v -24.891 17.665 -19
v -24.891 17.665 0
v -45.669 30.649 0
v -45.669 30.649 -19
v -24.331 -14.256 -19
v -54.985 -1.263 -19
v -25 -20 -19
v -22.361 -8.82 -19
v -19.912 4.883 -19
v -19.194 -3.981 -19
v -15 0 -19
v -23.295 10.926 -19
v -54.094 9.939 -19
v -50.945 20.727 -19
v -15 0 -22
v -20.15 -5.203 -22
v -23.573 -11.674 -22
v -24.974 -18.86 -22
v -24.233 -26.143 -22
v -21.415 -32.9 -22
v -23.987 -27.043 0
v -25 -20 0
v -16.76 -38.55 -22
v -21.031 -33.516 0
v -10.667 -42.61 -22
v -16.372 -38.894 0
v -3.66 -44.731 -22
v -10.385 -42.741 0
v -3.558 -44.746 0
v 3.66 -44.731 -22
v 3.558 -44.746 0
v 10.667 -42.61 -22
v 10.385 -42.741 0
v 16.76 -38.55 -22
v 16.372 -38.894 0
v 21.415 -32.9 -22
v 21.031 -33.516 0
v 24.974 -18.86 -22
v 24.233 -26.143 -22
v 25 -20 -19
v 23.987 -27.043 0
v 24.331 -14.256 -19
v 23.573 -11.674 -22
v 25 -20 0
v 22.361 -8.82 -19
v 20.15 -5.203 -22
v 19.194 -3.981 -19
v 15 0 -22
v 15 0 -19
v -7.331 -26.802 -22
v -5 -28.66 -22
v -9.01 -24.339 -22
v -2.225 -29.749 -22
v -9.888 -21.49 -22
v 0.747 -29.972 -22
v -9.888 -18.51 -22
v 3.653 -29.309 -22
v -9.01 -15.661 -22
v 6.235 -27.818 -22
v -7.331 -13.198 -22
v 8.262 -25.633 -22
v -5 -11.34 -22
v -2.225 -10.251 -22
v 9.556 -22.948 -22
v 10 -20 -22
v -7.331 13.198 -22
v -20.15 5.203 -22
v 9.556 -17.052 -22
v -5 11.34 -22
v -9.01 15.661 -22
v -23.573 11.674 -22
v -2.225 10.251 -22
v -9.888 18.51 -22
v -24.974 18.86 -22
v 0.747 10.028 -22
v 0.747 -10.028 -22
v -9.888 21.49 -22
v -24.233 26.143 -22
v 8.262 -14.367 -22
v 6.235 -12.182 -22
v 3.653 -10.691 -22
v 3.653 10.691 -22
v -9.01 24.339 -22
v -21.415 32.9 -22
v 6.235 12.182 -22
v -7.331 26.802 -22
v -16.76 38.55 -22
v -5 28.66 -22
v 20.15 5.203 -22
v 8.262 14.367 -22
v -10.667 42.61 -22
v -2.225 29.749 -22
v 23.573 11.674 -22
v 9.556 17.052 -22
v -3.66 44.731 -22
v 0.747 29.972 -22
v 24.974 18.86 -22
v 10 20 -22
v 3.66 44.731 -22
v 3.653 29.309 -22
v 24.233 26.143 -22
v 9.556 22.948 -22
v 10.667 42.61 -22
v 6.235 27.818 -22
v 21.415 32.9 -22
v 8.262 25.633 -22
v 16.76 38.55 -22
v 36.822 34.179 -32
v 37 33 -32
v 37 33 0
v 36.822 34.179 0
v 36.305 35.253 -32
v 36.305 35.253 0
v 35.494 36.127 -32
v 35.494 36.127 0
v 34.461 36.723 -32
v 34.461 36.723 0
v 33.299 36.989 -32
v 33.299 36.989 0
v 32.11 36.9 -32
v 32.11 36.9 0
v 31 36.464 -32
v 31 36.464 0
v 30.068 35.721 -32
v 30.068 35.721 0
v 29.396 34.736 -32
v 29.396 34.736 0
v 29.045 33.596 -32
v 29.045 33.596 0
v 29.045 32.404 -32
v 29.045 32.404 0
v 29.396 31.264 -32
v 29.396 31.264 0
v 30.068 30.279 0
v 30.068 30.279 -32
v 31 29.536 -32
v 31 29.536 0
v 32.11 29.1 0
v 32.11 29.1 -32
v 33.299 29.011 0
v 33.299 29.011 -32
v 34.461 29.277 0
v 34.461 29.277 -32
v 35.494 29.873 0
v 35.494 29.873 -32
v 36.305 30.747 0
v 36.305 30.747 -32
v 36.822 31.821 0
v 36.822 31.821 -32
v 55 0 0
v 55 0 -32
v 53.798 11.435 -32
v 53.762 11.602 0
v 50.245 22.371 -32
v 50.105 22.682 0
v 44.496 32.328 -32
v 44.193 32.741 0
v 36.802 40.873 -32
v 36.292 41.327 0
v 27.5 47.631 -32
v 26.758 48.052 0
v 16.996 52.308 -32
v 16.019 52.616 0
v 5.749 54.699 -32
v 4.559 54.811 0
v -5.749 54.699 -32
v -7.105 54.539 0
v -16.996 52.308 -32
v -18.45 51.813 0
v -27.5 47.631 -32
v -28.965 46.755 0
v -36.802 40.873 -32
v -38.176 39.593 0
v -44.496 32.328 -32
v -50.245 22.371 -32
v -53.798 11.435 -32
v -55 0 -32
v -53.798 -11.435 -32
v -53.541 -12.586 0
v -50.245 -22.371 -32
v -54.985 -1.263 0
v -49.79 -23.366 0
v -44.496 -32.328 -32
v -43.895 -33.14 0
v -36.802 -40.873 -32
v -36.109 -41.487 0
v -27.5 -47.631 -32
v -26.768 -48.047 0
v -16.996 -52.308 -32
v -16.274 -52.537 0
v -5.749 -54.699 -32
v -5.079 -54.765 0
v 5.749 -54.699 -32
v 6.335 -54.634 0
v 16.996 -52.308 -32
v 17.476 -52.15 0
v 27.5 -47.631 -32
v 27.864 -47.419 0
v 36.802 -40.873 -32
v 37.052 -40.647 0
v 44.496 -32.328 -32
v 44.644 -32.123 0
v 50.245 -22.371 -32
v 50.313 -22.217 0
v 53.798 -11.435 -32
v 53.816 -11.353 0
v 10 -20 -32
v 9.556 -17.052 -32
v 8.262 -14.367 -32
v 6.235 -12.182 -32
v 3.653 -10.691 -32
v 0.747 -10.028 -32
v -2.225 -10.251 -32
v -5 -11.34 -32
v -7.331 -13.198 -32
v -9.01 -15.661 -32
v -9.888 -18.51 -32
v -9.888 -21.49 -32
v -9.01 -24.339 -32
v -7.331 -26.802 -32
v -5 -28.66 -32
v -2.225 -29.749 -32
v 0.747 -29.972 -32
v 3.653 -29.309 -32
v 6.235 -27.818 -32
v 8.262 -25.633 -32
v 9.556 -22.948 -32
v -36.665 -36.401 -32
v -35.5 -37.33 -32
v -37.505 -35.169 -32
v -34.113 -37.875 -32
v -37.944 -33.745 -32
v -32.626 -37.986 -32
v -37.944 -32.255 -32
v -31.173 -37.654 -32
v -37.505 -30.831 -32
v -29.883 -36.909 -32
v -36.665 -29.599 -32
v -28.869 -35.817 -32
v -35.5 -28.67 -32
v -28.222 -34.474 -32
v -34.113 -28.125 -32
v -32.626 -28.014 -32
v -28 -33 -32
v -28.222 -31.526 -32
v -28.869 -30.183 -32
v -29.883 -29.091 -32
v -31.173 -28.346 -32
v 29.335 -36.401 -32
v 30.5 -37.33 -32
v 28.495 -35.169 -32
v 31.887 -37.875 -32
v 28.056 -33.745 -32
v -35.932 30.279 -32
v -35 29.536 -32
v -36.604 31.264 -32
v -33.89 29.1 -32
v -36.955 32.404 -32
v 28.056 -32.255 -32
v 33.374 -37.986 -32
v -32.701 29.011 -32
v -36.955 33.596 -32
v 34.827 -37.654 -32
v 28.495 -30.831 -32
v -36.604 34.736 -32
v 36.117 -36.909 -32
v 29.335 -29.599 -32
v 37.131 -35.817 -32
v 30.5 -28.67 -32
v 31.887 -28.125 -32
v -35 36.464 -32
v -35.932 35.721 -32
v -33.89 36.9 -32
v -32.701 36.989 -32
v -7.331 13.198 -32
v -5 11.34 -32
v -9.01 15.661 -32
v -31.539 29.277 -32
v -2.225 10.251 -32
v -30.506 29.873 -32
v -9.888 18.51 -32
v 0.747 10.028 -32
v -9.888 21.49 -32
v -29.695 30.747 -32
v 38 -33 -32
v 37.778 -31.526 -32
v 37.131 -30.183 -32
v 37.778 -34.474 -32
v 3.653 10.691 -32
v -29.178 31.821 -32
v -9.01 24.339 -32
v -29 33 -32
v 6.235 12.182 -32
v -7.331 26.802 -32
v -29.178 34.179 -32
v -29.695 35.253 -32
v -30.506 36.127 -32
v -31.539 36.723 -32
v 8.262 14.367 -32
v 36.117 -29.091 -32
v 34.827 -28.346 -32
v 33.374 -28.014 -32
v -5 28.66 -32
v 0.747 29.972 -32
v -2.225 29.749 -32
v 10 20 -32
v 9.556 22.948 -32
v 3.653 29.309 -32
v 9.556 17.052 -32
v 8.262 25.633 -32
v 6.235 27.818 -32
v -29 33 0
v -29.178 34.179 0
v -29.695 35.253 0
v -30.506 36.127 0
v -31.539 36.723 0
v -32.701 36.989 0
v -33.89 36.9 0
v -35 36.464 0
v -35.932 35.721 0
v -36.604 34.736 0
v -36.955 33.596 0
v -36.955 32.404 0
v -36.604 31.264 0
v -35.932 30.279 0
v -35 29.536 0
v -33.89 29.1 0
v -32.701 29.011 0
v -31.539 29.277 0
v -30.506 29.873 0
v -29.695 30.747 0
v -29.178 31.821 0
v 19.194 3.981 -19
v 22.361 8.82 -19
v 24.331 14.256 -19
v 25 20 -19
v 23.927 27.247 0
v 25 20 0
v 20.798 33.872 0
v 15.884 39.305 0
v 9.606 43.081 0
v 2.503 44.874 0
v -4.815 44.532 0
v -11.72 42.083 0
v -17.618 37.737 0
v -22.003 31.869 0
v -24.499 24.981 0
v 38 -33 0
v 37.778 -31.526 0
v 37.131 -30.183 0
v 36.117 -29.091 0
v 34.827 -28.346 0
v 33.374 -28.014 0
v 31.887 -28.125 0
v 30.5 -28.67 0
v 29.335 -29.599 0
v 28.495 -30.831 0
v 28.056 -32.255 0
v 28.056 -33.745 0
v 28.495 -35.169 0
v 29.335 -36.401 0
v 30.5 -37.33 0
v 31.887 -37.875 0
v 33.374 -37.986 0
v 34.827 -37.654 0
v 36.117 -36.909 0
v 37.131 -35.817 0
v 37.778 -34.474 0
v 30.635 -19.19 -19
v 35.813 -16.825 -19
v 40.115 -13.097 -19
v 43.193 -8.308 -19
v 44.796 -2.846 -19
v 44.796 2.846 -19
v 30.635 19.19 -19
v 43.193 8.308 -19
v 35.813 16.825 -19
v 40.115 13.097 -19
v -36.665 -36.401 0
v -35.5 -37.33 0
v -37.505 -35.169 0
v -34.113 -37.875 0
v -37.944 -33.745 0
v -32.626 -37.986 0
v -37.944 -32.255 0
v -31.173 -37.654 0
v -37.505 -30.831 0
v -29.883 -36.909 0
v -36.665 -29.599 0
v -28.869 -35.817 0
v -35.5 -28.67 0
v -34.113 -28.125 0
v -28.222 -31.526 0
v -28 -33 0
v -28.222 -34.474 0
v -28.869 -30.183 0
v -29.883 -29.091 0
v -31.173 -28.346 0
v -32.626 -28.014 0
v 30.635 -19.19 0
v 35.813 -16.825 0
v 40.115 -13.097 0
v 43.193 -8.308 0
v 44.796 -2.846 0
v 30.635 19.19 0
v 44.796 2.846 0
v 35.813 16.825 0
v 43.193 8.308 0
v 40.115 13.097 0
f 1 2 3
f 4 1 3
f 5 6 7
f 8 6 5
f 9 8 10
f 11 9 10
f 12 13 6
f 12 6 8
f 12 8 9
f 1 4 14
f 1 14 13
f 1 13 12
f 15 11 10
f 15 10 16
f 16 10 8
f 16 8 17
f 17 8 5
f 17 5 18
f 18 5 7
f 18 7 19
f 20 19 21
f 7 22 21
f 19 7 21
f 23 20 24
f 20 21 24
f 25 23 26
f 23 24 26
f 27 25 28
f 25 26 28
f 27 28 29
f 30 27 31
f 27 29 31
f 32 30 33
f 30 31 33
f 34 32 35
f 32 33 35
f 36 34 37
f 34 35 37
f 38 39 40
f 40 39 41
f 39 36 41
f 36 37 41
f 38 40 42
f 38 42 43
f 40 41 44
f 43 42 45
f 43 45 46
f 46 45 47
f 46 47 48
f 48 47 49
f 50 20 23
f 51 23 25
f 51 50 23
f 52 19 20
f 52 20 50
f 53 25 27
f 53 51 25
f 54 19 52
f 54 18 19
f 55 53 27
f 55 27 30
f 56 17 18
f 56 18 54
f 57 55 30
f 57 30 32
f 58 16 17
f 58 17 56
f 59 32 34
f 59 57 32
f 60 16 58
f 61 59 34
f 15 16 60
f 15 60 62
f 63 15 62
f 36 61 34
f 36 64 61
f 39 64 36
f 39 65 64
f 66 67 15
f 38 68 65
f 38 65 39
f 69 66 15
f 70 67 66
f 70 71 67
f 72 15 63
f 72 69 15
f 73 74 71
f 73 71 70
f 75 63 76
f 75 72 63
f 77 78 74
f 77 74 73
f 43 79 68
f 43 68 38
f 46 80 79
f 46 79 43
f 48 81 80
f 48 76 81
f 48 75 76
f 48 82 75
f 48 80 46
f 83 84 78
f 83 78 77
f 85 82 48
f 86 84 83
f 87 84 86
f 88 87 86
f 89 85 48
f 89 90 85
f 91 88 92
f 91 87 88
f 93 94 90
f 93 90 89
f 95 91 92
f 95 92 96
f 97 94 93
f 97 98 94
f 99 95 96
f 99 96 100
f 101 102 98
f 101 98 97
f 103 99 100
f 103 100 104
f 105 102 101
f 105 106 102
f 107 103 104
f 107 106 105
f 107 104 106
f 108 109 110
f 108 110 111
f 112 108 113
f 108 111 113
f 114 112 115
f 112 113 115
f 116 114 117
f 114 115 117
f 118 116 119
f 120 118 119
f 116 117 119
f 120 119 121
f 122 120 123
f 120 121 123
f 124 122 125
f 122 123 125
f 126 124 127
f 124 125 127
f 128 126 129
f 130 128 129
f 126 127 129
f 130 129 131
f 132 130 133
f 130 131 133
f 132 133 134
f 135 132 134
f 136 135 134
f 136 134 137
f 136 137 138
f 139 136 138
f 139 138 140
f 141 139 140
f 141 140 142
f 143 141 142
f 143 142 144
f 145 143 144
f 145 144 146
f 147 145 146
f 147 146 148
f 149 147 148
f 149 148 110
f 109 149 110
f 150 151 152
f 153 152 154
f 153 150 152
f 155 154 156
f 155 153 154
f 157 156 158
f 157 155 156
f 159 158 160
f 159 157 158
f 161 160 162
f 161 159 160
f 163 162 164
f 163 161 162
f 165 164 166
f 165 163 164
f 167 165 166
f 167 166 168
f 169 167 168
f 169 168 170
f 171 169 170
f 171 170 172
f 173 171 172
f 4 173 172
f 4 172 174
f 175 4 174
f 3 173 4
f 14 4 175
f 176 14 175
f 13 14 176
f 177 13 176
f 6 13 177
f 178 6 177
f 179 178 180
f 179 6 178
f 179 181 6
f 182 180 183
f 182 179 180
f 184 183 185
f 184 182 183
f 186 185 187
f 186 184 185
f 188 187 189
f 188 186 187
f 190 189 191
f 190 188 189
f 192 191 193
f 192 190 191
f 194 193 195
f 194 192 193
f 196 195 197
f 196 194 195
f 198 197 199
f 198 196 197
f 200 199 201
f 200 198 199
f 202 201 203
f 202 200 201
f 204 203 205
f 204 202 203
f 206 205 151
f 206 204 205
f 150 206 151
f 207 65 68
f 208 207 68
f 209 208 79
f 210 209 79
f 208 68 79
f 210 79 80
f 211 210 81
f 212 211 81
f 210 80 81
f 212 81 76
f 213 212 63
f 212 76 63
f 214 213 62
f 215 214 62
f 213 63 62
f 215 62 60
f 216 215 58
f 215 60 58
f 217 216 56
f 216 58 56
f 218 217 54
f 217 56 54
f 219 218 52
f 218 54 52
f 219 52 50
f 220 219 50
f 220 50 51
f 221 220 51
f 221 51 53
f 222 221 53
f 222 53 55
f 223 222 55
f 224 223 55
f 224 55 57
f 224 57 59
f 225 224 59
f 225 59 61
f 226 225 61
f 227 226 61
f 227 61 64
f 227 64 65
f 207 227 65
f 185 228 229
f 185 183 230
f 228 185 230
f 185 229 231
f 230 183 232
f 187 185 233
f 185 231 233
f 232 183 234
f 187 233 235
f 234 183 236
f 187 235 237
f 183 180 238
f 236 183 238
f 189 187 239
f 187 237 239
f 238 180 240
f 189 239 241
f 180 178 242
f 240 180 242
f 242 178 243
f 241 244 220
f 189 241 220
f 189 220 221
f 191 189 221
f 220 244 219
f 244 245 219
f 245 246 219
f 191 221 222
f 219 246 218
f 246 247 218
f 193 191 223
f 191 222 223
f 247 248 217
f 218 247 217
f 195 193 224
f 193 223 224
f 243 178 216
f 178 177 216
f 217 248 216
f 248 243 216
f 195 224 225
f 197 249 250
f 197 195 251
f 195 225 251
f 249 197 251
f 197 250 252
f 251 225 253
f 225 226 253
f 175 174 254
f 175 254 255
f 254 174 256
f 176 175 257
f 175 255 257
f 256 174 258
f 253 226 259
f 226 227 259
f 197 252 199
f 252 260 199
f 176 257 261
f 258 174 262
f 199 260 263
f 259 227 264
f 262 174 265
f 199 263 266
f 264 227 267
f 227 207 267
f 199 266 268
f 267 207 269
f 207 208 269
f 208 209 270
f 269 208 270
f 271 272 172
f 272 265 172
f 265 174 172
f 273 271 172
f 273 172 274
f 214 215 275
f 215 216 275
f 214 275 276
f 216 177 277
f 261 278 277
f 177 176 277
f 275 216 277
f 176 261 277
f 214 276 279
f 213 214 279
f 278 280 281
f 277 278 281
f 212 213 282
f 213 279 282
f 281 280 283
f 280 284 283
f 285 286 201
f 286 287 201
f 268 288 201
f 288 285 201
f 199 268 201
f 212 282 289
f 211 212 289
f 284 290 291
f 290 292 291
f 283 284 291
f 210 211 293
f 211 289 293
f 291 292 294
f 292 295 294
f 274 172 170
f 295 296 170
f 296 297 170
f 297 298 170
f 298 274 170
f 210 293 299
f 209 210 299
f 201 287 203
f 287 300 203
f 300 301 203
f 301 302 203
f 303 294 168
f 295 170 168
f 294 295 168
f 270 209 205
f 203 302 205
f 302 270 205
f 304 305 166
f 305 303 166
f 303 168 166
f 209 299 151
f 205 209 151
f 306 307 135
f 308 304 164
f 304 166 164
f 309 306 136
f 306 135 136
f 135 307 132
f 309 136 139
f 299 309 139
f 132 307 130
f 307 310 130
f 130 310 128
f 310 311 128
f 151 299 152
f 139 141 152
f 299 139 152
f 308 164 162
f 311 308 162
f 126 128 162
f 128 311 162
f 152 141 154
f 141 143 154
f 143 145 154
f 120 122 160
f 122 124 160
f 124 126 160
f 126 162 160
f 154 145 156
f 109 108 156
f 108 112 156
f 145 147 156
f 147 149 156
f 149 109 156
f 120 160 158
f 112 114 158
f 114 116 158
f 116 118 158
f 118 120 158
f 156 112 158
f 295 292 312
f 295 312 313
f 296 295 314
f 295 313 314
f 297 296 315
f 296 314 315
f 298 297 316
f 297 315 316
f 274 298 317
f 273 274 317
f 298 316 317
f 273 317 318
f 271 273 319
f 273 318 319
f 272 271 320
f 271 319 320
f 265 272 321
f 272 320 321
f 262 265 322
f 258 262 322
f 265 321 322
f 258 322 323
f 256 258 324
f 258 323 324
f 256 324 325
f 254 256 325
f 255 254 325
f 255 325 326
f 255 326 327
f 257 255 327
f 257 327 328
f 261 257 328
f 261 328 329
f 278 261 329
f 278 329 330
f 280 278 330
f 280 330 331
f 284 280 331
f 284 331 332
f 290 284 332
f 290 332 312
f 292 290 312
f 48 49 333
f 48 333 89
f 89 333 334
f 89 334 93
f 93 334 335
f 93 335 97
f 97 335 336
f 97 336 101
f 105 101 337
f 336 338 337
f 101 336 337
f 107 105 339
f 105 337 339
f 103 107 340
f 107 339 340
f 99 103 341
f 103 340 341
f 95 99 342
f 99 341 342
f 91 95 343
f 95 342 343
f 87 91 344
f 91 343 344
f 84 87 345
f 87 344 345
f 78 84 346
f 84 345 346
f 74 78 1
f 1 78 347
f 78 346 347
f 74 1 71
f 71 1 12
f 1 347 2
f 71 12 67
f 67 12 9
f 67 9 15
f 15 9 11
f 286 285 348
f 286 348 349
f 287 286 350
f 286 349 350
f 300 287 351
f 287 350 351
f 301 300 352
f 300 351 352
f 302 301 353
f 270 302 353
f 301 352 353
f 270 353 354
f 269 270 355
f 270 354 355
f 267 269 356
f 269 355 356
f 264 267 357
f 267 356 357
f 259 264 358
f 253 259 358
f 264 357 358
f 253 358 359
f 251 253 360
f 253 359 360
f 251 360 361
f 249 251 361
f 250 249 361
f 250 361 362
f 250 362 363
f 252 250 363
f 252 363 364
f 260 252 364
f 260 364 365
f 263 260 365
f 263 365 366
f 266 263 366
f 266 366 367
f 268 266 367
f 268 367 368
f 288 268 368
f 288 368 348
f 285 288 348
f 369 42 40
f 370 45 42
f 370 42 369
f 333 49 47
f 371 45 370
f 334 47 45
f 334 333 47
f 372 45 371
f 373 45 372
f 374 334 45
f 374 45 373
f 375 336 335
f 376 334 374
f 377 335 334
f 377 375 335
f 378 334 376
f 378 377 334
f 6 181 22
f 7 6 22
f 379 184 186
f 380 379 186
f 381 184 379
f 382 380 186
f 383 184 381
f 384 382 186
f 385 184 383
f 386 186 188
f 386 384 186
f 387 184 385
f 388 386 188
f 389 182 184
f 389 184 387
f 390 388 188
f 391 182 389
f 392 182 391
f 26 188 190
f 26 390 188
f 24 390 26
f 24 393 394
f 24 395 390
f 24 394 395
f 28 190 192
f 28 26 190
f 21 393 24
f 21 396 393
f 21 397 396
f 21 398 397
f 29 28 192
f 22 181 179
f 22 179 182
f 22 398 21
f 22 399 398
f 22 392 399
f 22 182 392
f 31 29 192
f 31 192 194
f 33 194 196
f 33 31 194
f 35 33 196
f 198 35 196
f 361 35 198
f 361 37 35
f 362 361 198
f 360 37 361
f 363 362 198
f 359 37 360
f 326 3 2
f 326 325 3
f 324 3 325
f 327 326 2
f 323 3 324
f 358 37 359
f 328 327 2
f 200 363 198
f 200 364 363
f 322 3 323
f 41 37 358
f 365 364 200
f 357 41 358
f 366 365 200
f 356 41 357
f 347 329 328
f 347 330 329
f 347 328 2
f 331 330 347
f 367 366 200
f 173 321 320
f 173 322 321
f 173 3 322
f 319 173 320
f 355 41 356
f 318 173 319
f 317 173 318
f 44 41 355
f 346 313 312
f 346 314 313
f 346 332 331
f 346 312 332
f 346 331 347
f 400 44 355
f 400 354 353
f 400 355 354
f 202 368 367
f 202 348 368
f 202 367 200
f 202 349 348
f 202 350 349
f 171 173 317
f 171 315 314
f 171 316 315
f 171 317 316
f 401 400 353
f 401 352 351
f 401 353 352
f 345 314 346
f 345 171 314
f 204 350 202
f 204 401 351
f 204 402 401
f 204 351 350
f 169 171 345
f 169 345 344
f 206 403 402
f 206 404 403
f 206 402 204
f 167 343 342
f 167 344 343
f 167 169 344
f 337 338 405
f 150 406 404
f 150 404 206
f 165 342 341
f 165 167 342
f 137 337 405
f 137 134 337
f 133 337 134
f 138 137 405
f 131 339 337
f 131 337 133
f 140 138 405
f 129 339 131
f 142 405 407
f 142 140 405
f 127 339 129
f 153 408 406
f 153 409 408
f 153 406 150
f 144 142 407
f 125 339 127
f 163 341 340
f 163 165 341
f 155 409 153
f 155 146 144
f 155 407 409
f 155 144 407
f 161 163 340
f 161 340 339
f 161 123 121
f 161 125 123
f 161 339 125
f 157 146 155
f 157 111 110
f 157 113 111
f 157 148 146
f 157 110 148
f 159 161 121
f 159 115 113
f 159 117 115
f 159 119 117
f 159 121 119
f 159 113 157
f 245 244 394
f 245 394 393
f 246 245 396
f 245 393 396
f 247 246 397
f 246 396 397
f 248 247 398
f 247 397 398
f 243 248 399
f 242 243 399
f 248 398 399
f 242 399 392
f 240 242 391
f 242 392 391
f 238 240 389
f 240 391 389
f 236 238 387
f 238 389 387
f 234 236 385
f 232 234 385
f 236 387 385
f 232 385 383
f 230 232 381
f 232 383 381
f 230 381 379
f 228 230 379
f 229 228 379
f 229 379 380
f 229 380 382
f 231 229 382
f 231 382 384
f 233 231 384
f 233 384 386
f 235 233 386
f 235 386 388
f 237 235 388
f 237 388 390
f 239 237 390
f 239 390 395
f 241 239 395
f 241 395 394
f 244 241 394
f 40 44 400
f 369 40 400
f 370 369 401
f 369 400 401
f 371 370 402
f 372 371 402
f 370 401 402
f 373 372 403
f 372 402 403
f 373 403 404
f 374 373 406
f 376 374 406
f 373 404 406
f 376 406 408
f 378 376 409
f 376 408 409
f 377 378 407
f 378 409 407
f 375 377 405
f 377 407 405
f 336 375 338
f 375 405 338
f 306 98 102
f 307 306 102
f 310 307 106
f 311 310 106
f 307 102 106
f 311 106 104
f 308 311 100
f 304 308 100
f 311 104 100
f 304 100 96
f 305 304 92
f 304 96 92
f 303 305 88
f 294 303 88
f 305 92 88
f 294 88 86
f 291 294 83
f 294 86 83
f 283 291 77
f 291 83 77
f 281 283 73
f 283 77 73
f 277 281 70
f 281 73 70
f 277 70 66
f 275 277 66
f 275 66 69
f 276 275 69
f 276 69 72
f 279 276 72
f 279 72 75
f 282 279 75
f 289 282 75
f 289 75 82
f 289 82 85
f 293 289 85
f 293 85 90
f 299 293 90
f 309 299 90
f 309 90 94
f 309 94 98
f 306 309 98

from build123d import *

# Parameters (mm, degrees)
SKETCH1_R           = 55
BOSS_EXTRUDE1_DEPTH = 32
SKETCH1_19_R        = 10
CUT_EXTRUDE1_DEPTH  = 22
CUT_EXTRUDE2_DEPTH  = 19
SKETCH1_21_R        = 10
SKETCH1_21_R_2      = 4
SKETCH1_21_R_3      = 5
CUT_EXTRUDE3_DEPTH  = 85.107074613


with BuildPart() as part:
    # Sketch1 → Boss-Extrude1 (new body)
    with BuildSketch(Plane.XY):
        Circle(SKETCH1_R)
    extrude(amount=-BOSS_EXTRUDE1_DEPTH)

    # Sketch1<19> → Cut-Extrude1 (cut)
    # profile 1 of 3: a face of its own
    with BuildSketch(Plane.XY):
        with BuildLine():
            ThreePointArc((15, 0), (0, 45), (-15, 0))
            ThreePointArc((-15, 0), (0, -45), (15, 0))
        make_face()
        with Locations((0, -20)):
            Circle(SKETCH1_19_R, mode=Mode.SUBTRACT)
        with Locations((0, 20)):
            Circle(SKETCH1_19_R, mode=Mode.SUBTRACT)
    # profile 2 of 3: a face of its own
    with BuildSketch(Plane.XY):
        with Locations((0, -20)):
            Circle(SKETCH1_19_R)
    # profile 3 of 3: a face of its own
    with BuildSketch(Plane.XY):
        with Locations((0, 20)):
            Circle(SKETCH1_19_R)
    extrude(amount=-CUT_EXTRUDE1_DEPTH, mode=Mode.SUBTRACT)

    # Sketch1<20> → Cut-Extrude2 (cut)
    with BuildSketch(Plane.XY):
        with BuildLine():
            ThreePointArc((-45.668792135, 30.649003654), (-52.795976975, 15.41378653), (-54.985496966, -1.262981944))
            Line((-54.985496966, -1.262981944), (-25, -20))
            ThreePointArc((-25, -20), (-22.360679775, -8.819660113), (-15, 0))
            ThreePointArc((-15, 0), (-21.813646246, 7.786694246), (-24.890758601, 17.665447305))
            Line((-24.890758601, 17.665447305), (-45.668792135, 30.649003654))
        make_face()
        with BuildLine():
            ThreePointArc((15, 0), (22.360679775, -8.819660113), (25, -20))
            ThreePointArc((25, -20), (45, 0), (25, 20))
            ThreePointArc((25, 20), (22.360679775, 8.819660113), (15, 0))
        make_face()
    extrude(amount=-CUT_EXTRUDE2_DEPTH, mode=Mode.SUBTRACT)

    # Sketch1<21> → Cut-Extrude3 (cut, through all)
    with BuildSketch(Plane.XY):
        with Locations((0, 20)):
            Circle(SKETCH1_21_R)
        with Locations((0, -20)):
            Circle(SKETCH1_21_R)
        with Locations((-33, 33)):
            Circle(SKETCH1_21_R_2)
        with Locations((33, 33)):
            Circle(SKETCH1_21_R_2)
        with Locations((33, -33)):
            Circle(SKETCH1_21_R_3)
        with Locations((-33, -33)):
            Circle(SKETCH1_21_R_3)
    extrude(amount=-CUT_EXTRUDE3_DEPTH, mode=Mode.SUBTRACT)


solid = part.part
